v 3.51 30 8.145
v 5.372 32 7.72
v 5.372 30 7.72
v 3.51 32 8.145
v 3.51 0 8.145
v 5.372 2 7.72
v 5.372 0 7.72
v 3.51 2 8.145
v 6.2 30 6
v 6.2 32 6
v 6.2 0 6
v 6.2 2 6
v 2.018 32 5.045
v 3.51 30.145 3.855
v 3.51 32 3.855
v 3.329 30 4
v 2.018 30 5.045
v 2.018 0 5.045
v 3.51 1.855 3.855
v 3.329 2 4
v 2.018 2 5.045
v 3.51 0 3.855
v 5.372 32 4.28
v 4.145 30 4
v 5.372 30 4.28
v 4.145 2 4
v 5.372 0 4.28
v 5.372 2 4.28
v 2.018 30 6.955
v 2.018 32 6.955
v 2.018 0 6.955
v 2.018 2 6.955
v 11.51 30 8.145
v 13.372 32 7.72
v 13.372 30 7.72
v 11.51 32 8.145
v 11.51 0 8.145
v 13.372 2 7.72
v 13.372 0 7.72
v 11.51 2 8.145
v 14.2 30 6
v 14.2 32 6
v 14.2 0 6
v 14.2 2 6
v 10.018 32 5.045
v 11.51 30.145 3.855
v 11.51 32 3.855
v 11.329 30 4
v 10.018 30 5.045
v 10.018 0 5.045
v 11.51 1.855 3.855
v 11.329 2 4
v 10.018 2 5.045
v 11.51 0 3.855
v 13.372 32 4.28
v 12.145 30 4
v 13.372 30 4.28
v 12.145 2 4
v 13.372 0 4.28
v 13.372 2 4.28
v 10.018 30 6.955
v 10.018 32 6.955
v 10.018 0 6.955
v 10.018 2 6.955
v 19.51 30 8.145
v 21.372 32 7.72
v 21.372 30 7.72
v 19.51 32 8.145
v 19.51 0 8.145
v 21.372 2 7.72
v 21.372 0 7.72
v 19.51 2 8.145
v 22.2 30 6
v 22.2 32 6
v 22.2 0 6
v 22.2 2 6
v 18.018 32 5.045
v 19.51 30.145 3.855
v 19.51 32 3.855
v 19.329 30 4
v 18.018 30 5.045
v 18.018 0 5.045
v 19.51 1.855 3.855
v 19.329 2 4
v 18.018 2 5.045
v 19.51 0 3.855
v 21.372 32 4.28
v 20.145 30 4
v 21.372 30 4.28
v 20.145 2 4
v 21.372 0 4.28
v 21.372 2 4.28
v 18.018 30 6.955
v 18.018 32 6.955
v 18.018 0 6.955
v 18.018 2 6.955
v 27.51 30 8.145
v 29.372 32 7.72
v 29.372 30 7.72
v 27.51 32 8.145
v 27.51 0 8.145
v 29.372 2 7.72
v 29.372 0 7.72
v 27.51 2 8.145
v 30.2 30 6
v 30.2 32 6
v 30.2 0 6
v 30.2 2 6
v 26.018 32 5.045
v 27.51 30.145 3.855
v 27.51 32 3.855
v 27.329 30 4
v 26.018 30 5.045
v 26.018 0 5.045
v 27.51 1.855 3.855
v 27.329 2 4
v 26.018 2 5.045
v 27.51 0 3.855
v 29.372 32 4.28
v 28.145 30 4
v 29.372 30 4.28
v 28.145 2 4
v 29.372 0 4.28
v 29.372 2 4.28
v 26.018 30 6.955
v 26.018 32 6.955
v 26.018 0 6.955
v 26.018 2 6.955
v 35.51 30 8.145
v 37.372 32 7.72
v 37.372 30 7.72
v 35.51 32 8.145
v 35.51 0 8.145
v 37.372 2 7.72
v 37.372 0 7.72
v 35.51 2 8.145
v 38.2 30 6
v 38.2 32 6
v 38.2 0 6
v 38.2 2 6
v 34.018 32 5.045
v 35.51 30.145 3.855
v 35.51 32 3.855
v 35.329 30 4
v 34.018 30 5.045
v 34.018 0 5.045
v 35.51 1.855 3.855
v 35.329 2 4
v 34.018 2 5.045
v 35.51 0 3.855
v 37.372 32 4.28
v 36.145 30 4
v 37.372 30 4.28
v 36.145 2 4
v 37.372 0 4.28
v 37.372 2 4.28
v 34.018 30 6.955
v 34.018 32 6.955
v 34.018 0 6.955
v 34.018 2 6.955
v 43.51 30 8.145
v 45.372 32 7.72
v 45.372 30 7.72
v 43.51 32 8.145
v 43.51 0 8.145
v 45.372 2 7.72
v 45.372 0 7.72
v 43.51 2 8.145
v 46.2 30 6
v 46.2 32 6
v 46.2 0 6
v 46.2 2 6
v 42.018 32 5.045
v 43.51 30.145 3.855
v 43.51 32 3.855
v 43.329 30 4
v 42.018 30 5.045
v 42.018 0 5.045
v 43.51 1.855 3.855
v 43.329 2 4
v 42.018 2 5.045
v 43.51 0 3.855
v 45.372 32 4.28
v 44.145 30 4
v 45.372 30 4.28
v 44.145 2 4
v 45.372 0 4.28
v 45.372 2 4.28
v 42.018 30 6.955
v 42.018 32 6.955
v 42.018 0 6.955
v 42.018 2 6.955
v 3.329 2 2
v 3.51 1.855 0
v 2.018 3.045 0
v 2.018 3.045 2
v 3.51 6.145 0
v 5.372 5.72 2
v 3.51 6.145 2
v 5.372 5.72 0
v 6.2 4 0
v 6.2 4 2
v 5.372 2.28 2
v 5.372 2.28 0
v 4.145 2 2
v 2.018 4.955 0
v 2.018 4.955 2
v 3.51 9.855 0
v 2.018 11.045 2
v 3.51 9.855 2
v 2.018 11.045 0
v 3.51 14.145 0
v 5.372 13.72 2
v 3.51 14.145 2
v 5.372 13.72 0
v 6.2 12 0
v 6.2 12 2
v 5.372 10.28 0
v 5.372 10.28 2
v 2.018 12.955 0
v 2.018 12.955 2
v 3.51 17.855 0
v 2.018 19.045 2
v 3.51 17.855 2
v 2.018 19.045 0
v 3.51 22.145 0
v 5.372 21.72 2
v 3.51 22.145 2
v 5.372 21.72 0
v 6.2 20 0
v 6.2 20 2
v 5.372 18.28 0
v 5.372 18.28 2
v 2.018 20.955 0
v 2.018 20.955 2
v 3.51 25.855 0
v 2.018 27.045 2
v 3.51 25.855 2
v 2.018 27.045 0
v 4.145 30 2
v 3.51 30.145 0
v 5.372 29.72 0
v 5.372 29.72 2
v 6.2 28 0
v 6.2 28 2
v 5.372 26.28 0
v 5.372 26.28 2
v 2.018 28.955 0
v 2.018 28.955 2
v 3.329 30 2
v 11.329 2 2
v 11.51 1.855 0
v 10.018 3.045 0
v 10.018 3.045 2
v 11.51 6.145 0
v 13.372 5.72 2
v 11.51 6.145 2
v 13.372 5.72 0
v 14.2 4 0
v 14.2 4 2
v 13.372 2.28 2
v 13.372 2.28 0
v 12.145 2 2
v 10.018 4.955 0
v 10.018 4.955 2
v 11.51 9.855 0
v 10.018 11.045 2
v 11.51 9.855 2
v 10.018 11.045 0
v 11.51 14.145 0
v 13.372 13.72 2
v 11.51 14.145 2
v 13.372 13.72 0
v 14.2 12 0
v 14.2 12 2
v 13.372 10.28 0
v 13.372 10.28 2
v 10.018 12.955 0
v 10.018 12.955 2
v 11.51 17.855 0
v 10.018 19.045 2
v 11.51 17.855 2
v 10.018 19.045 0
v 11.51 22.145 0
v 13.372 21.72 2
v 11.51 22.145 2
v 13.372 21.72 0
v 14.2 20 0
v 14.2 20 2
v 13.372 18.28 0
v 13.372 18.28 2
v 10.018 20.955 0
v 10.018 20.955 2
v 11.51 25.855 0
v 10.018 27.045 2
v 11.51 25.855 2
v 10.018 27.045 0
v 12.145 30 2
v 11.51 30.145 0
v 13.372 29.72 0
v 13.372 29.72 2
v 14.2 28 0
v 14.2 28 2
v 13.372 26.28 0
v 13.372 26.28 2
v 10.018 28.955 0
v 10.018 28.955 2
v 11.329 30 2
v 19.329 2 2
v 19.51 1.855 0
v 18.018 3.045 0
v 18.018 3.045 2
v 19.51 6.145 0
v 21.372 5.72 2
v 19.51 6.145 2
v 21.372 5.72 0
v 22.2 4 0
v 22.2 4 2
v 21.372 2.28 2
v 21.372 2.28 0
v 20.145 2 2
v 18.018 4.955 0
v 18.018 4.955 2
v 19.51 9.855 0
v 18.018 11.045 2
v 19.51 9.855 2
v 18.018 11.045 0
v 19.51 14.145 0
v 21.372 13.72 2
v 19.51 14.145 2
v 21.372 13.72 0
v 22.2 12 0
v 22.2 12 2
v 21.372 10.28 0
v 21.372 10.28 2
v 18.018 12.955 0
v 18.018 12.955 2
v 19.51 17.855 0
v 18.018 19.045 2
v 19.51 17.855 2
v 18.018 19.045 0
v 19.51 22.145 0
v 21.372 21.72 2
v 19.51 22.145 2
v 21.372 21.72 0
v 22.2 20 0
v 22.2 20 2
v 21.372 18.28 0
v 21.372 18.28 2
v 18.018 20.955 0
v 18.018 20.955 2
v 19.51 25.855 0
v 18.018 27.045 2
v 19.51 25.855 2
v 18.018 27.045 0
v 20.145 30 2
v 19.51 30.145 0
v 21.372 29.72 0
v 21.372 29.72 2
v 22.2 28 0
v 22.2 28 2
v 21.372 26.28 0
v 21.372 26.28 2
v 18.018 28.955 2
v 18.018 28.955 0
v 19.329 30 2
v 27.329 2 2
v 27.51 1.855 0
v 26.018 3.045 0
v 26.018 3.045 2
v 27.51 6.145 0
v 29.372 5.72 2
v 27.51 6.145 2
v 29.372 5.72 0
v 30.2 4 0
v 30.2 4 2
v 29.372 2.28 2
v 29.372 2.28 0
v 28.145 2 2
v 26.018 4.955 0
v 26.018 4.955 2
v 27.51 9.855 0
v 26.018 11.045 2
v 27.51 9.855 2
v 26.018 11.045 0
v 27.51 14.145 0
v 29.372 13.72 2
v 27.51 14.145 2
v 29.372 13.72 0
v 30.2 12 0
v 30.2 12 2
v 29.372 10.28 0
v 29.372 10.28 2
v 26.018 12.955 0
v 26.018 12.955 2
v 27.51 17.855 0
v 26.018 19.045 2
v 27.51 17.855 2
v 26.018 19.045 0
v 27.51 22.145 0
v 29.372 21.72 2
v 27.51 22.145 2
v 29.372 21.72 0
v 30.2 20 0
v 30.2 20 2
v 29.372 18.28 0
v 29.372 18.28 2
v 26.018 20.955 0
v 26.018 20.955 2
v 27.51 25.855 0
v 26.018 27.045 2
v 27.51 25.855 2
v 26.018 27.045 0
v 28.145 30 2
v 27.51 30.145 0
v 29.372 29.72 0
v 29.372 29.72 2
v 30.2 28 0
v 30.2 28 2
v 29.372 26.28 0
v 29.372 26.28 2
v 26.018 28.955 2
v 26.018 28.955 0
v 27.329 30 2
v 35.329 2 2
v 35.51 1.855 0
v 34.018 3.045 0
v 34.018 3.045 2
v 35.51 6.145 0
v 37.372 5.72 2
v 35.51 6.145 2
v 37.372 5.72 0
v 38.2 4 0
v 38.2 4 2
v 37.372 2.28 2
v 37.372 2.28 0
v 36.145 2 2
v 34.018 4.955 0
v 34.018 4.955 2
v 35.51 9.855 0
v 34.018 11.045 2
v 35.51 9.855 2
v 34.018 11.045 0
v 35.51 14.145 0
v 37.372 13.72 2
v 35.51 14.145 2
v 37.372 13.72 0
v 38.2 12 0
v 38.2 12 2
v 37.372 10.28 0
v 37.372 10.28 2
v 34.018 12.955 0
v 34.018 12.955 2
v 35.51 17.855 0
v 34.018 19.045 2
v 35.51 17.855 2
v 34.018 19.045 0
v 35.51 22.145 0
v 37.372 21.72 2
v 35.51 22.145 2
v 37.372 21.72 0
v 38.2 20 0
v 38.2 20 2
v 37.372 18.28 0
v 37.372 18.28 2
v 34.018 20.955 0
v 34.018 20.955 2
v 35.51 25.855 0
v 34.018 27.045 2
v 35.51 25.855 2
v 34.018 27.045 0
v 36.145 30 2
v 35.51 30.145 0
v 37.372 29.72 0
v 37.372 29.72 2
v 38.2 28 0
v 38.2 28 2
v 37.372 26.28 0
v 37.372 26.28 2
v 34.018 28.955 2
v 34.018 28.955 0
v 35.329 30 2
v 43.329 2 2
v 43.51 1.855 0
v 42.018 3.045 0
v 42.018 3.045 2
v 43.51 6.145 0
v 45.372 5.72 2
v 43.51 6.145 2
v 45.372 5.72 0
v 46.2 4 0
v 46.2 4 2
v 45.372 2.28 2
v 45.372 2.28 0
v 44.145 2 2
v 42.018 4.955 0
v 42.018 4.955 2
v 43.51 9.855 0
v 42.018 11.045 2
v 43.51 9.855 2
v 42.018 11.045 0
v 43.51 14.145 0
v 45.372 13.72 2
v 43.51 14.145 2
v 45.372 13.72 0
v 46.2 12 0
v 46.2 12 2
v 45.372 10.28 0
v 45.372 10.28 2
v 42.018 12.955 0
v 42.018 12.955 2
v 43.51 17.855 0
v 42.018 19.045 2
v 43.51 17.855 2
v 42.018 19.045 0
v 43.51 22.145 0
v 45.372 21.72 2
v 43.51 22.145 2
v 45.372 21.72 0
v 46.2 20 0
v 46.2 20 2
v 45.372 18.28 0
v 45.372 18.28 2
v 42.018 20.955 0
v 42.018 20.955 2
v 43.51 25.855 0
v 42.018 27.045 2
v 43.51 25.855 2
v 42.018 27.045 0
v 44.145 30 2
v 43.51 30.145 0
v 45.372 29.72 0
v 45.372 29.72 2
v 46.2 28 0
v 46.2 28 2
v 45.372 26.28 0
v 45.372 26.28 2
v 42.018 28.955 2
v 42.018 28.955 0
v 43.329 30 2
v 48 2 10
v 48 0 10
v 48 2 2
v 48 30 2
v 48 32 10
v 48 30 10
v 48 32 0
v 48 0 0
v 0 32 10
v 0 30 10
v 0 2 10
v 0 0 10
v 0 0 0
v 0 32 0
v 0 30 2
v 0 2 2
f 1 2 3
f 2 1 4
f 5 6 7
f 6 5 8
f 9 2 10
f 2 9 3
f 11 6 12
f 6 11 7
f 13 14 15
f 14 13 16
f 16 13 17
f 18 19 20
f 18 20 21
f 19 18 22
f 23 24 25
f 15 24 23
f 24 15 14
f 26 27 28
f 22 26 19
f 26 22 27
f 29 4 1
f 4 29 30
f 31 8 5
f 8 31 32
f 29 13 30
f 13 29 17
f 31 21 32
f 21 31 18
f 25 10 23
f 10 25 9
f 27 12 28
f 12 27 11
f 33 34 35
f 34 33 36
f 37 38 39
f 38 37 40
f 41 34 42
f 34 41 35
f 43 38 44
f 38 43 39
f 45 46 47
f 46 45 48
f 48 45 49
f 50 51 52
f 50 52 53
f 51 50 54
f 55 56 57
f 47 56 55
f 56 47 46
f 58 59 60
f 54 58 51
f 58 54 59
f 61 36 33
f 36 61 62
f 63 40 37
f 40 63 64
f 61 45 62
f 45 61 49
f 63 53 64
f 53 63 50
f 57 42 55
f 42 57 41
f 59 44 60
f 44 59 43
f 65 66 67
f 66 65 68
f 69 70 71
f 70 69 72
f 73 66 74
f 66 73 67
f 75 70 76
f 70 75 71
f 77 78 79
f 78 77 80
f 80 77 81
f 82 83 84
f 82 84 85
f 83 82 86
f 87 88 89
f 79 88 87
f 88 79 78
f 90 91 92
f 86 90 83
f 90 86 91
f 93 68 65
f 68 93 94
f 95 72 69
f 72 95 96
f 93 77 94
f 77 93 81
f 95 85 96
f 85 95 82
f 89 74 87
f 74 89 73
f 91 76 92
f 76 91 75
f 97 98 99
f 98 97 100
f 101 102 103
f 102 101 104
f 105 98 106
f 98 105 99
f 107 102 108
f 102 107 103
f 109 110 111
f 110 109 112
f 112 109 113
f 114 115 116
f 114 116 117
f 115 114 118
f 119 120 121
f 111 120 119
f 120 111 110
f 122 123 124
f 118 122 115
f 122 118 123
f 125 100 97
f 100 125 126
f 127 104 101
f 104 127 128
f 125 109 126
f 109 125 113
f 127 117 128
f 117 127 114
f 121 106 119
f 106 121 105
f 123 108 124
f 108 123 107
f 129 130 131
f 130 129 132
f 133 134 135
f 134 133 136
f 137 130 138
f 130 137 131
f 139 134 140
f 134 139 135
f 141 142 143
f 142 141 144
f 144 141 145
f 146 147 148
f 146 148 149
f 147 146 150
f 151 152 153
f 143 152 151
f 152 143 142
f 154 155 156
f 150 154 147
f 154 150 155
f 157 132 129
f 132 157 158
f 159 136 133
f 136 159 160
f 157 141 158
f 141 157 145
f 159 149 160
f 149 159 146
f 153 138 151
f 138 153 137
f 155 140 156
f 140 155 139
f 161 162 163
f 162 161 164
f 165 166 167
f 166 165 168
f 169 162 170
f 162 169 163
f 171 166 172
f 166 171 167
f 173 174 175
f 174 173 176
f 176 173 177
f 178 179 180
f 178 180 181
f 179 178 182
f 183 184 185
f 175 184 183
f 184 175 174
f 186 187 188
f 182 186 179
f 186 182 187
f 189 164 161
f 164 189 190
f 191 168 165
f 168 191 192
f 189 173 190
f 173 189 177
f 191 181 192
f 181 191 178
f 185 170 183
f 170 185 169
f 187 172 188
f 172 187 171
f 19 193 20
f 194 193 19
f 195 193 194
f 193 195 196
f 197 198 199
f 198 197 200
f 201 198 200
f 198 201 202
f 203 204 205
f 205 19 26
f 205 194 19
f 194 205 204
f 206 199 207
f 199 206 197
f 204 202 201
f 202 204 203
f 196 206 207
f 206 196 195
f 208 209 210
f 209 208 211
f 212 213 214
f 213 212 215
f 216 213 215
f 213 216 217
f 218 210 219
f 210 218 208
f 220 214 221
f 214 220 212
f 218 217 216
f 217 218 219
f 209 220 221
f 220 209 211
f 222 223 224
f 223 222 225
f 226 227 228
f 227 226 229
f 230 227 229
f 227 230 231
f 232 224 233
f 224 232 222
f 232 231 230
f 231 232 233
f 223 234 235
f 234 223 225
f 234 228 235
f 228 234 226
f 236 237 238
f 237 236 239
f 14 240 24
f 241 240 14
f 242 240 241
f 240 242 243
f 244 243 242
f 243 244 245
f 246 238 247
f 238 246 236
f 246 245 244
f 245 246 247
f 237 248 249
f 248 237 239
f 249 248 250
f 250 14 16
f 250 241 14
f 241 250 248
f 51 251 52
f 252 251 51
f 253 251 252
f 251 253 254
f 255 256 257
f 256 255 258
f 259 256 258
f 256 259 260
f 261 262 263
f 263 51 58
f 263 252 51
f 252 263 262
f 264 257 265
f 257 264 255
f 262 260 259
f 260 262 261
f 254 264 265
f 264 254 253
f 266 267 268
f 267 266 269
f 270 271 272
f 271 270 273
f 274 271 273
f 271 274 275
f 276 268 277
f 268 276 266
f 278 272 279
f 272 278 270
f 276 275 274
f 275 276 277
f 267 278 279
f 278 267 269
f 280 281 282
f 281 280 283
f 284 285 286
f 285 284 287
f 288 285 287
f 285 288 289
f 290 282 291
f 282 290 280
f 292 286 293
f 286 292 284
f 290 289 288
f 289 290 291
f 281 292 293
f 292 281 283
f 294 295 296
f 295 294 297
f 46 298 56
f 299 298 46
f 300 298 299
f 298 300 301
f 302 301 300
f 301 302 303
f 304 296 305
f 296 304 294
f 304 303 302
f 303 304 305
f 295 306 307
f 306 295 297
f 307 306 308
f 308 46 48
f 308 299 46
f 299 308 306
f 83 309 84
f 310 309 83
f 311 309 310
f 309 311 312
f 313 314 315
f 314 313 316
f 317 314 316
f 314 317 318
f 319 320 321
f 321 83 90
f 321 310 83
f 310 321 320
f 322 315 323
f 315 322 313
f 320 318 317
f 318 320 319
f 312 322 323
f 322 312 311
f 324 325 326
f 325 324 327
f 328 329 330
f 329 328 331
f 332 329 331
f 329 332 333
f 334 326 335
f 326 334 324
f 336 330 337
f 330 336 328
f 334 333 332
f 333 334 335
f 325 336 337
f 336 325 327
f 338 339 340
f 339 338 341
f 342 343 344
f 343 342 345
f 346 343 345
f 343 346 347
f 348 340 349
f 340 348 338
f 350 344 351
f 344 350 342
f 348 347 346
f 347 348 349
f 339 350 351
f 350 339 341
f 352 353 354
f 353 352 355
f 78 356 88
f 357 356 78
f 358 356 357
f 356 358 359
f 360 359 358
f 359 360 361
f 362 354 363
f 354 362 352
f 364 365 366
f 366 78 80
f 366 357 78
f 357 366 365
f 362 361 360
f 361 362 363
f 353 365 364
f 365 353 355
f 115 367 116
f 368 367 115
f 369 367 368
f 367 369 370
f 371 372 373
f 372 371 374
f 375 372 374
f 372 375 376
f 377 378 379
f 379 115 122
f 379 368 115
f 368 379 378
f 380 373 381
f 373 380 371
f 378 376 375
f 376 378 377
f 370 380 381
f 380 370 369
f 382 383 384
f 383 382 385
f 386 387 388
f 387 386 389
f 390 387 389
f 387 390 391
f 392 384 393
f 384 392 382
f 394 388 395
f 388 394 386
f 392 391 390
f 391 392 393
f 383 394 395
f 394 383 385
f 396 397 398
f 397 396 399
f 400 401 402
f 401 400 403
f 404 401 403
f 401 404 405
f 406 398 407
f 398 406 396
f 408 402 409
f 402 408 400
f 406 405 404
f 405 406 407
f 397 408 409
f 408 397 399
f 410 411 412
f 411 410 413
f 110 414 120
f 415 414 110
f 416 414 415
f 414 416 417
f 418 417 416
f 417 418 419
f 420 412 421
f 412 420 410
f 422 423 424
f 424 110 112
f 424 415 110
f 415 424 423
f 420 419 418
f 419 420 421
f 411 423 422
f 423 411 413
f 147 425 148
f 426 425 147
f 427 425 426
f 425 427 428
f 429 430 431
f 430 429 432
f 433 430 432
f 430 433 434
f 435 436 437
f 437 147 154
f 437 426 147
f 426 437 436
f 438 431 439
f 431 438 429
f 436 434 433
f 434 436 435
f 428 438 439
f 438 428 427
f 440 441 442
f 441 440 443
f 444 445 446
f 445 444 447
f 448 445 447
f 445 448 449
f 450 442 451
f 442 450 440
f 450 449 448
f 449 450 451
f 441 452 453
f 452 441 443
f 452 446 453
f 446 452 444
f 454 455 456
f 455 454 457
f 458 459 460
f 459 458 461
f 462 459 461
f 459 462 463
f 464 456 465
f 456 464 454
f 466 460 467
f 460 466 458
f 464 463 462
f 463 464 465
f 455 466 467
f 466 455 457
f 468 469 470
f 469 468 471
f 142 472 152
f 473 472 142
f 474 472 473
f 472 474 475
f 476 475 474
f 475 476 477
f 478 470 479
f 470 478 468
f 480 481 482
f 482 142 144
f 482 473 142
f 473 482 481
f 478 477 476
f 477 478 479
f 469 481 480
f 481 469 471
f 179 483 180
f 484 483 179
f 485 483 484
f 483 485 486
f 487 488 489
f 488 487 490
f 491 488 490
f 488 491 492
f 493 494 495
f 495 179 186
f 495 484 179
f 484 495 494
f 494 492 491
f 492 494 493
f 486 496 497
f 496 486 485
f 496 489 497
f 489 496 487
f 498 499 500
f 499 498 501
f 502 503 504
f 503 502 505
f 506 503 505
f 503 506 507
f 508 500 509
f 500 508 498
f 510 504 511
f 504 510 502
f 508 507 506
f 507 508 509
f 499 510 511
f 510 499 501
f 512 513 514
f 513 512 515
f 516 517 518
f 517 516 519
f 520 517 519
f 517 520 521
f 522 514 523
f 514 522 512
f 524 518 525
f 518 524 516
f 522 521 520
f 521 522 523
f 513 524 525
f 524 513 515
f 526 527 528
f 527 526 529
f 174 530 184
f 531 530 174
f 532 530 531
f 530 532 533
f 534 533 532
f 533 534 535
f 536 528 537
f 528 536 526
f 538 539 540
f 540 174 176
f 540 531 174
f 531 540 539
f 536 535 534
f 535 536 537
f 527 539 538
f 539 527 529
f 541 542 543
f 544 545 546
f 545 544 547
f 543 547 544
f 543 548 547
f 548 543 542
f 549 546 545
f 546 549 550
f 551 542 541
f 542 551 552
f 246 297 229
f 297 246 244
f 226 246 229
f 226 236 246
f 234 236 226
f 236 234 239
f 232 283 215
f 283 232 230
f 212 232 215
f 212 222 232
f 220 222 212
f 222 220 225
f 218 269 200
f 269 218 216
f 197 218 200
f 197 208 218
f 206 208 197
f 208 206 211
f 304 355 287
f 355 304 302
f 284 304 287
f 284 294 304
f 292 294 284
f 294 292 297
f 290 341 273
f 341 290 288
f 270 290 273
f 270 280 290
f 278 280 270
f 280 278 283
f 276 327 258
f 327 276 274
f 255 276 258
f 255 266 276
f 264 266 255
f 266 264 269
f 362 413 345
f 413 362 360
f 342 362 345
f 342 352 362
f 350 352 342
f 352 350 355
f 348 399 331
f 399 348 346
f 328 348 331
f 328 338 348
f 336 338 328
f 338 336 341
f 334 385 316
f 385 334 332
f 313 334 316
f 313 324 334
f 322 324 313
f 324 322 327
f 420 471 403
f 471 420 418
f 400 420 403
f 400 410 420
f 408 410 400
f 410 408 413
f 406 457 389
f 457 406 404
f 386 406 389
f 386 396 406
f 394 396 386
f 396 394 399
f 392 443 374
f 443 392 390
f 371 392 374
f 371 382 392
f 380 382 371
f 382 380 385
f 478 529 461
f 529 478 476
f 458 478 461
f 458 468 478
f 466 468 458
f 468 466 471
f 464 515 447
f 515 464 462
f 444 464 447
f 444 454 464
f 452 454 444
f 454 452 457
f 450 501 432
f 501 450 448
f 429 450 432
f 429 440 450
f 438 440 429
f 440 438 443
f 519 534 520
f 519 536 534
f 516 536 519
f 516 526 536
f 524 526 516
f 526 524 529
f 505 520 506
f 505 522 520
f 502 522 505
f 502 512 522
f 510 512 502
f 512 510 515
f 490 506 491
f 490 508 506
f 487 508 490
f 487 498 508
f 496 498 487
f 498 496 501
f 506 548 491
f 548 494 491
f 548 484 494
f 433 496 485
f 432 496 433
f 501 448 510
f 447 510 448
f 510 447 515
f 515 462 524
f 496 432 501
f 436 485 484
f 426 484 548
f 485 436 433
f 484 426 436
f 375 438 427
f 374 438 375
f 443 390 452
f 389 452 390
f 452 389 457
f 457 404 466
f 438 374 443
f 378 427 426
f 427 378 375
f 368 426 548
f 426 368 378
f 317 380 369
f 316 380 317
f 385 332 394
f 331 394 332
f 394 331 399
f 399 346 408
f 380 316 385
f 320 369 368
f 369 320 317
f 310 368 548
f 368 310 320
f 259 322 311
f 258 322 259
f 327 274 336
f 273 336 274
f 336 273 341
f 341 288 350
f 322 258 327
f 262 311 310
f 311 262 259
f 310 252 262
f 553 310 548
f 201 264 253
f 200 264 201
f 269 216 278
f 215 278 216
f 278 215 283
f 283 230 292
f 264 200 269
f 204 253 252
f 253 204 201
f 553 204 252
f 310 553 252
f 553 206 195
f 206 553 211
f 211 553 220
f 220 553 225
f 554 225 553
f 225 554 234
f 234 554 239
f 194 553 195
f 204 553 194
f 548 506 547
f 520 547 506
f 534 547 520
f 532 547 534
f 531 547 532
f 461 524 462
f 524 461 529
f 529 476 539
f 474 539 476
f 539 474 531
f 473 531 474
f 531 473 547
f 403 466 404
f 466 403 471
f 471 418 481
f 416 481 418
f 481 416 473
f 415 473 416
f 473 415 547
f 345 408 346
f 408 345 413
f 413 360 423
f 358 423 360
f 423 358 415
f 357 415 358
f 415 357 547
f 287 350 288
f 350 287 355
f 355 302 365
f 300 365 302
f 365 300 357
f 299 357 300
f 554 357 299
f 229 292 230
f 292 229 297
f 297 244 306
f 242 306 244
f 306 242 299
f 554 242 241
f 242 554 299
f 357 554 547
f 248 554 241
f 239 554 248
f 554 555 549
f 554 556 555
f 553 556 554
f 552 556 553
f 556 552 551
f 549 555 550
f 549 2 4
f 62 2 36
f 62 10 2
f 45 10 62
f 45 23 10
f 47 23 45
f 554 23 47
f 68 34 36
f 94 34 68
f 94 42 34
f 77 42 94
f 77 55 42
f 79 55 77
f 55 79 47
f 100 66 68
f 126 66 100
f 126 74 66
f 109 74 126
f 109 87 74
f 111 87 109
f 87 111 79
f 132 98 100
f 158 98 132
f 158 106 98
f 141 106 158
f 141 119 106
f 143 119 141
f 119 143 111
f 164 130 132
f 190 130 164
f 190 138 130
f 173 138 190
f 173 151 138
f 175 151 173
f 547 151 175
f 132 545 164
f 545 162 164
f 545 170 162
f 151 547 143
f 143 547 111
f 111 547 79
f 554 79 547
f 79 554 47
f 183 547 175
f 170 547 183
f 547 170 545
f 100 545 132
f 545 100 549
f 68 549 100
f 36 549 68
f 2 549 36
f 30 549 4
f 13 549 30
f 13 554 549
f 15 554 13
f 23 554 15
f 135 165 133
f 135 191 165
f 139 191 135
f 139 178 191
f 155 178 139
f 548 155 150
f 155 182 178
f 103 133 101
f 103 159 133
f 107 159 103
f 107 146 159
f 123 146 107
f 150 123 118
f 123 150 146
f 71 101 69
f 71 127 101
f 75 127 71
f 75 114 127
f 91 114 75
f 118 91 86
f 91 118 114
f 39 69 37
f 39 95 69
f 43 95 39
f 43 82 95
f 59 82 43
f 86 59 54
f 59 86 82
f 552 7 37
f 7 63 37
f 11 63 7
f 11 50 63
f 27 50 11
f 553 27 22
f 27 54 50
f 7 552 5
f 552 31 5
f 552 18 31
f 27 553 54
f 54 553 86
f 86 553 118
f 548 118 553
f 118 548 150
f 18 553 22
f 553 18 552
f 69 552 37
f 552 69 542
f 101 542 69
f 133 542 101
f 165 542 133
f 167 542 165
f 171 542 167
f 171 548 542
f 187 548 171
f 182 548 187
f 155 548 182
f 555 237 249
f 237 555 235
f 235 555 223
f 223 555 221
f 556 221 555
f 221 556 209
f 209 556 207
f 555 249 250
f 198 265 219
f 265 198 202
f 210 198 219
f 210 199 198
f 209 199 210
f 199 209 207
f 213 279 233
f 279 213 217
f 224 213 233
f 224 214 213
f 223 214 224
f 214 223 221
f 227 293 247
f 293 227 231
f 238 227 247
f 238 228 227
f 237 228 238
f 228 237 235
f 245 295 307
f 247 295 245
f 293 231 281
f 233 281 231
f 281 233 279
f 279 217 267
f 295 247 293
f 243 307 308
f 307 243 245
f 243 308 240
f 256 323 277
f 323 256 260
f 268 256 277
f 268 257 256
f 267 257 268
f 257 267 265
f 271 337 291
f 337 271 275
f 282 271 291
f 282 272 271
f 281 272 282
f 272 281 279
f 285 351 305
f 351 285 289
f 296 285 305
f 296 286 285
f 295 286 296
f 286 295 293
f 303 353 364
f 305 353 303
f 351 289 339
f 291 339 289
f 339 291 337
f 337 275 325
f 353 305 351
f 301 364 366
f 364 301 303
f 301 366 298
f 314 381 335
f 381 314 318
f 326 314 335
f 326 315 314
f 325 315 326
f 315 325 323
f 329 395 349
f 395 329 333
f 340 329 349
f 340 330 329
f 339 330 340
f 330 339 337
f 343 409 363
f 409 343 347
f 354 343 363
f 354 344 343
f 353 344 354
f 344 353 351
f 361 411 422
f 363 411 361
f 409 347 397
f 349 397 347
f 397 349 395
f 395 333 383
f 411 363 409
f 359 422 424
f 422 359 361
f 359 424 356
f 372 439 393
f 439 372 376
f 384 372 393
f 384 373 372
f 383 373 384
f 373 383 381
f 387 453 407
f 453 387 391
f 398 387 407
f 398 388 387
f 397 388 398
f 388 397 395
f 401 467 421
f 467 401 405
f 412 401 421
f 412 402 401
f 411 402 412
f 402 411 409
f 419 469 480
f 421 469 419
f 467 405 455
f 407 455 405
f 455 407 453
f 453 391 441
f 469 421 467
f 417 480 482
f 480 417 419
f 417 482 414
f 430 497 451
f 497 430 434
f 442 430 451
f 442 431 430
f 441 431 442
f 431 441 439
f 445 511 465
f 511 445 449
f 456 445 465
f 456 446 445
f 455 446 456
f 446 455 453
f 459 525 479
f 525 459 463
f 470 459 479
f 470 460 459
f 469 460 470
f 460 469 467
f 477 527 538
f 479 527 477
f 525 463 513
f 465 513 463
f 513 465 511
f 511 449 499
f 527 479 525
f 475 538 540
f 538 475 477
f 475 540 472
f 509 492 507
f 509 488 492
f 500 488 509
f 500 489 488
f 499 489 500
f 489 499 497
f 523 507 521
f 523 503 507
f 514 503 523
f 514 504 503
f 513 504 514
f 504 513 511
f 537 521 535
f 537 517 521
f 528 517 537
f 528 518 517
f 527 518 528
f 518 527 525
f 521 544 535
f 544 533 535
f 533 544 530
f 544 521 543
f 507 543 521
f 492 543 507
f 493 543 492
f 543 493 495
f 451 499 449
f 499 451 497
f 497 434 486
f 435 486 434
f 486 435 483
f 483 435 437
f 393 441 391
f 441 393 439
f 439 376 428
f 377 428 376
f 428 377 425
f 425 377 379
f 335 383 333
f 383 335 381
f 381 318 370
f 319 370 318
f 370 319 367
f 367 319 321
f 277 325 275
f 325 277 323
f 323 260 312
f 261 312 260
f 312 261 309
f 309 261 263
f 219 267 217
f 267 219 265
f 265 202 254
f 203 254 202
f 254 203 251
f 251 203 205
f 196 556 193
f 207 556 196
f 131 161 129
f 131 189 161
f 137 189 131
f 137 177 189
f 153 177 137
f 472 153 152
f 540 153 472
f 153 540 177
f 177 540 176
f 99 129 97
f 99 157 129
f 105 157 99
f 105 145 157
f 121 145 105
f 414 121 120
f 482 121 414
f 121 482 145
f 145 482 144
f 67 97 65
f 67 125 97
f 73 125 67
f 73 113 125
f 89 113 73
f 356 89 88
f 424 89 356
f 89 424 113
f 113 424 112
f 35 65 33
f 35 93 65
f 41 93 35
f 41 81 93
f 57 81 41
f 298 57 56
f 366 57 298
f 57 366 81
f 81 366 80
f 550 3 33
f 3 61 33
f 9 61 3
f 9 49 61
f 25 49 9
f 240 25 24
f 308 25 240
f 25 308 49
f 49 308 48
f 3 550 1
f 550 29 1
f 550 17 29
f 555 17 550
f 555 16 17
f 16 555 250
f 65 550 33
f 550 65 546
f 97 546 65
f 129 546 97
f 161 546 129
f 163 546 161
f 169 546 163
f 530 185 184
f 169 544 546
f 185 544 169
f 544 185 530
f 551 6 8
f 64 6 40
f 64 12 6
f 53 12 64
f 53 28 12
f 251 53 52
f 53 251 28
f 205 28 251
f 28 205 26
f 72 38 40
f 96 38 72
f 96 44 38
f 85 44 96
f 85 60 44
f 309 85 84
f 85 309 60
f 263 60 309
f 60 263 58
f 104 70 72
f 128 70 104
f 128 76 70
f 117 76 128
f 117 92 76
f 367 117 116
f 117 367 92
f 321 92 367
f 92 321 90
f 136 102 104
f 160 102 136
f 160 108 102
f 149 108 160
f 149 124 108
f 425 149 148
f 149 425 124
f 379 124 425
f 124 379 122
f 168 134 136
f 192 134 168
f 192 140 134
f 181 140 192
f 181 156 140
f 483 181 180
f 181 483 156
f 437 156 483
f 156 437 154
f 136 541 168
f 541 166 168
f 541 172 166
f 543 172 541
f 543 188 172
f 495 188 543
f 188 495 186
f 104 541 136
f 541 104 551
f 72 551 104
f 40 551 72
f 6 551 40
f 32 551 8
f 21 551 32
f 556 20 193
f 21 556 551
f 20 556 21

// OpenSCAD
// configuration
space = 4;
hole = 4;
pad = space/2;
length = 6;
width = 4;

l = length*hole + (length-1)*space + 2*pad;
w = width*hole + (width-1)*space + 2*pad;
h = hole + 3*pad;

difference() {
    
    // total piece
    cube([l, w, h]);
    
    // hollow internal
    translate([-pad, pad, pad]) {
        cube([l + 2*pad, w - 2*pad, h]);
    };
    
    // horizontal holes
    for(i=[1:length]) {
        translate([
            i*hole + (i - 1)*space - hole/2 + pad,
            w/2,
            2*pad + hole/2
        ]) {
            rotate([90, 0, 0]) {
                translate([0, 0, -w/2 -pad]) {
                    cylinder(h=w + 2*pad, r=hole/2 + 0.2);
                };
            };
        };
    };

    for (i=[1:length]) {
        for (j=[1:width]) {
            translate([
                i*hole + (i-1)*space - hole/2 + pad,
                j*hole + (j-1)*space - hole/2 + pad,
                -pad
            ]) {
                cylinder(h=3*pad, r=hole/2 + 0.2);
            }
        }
    }
};
